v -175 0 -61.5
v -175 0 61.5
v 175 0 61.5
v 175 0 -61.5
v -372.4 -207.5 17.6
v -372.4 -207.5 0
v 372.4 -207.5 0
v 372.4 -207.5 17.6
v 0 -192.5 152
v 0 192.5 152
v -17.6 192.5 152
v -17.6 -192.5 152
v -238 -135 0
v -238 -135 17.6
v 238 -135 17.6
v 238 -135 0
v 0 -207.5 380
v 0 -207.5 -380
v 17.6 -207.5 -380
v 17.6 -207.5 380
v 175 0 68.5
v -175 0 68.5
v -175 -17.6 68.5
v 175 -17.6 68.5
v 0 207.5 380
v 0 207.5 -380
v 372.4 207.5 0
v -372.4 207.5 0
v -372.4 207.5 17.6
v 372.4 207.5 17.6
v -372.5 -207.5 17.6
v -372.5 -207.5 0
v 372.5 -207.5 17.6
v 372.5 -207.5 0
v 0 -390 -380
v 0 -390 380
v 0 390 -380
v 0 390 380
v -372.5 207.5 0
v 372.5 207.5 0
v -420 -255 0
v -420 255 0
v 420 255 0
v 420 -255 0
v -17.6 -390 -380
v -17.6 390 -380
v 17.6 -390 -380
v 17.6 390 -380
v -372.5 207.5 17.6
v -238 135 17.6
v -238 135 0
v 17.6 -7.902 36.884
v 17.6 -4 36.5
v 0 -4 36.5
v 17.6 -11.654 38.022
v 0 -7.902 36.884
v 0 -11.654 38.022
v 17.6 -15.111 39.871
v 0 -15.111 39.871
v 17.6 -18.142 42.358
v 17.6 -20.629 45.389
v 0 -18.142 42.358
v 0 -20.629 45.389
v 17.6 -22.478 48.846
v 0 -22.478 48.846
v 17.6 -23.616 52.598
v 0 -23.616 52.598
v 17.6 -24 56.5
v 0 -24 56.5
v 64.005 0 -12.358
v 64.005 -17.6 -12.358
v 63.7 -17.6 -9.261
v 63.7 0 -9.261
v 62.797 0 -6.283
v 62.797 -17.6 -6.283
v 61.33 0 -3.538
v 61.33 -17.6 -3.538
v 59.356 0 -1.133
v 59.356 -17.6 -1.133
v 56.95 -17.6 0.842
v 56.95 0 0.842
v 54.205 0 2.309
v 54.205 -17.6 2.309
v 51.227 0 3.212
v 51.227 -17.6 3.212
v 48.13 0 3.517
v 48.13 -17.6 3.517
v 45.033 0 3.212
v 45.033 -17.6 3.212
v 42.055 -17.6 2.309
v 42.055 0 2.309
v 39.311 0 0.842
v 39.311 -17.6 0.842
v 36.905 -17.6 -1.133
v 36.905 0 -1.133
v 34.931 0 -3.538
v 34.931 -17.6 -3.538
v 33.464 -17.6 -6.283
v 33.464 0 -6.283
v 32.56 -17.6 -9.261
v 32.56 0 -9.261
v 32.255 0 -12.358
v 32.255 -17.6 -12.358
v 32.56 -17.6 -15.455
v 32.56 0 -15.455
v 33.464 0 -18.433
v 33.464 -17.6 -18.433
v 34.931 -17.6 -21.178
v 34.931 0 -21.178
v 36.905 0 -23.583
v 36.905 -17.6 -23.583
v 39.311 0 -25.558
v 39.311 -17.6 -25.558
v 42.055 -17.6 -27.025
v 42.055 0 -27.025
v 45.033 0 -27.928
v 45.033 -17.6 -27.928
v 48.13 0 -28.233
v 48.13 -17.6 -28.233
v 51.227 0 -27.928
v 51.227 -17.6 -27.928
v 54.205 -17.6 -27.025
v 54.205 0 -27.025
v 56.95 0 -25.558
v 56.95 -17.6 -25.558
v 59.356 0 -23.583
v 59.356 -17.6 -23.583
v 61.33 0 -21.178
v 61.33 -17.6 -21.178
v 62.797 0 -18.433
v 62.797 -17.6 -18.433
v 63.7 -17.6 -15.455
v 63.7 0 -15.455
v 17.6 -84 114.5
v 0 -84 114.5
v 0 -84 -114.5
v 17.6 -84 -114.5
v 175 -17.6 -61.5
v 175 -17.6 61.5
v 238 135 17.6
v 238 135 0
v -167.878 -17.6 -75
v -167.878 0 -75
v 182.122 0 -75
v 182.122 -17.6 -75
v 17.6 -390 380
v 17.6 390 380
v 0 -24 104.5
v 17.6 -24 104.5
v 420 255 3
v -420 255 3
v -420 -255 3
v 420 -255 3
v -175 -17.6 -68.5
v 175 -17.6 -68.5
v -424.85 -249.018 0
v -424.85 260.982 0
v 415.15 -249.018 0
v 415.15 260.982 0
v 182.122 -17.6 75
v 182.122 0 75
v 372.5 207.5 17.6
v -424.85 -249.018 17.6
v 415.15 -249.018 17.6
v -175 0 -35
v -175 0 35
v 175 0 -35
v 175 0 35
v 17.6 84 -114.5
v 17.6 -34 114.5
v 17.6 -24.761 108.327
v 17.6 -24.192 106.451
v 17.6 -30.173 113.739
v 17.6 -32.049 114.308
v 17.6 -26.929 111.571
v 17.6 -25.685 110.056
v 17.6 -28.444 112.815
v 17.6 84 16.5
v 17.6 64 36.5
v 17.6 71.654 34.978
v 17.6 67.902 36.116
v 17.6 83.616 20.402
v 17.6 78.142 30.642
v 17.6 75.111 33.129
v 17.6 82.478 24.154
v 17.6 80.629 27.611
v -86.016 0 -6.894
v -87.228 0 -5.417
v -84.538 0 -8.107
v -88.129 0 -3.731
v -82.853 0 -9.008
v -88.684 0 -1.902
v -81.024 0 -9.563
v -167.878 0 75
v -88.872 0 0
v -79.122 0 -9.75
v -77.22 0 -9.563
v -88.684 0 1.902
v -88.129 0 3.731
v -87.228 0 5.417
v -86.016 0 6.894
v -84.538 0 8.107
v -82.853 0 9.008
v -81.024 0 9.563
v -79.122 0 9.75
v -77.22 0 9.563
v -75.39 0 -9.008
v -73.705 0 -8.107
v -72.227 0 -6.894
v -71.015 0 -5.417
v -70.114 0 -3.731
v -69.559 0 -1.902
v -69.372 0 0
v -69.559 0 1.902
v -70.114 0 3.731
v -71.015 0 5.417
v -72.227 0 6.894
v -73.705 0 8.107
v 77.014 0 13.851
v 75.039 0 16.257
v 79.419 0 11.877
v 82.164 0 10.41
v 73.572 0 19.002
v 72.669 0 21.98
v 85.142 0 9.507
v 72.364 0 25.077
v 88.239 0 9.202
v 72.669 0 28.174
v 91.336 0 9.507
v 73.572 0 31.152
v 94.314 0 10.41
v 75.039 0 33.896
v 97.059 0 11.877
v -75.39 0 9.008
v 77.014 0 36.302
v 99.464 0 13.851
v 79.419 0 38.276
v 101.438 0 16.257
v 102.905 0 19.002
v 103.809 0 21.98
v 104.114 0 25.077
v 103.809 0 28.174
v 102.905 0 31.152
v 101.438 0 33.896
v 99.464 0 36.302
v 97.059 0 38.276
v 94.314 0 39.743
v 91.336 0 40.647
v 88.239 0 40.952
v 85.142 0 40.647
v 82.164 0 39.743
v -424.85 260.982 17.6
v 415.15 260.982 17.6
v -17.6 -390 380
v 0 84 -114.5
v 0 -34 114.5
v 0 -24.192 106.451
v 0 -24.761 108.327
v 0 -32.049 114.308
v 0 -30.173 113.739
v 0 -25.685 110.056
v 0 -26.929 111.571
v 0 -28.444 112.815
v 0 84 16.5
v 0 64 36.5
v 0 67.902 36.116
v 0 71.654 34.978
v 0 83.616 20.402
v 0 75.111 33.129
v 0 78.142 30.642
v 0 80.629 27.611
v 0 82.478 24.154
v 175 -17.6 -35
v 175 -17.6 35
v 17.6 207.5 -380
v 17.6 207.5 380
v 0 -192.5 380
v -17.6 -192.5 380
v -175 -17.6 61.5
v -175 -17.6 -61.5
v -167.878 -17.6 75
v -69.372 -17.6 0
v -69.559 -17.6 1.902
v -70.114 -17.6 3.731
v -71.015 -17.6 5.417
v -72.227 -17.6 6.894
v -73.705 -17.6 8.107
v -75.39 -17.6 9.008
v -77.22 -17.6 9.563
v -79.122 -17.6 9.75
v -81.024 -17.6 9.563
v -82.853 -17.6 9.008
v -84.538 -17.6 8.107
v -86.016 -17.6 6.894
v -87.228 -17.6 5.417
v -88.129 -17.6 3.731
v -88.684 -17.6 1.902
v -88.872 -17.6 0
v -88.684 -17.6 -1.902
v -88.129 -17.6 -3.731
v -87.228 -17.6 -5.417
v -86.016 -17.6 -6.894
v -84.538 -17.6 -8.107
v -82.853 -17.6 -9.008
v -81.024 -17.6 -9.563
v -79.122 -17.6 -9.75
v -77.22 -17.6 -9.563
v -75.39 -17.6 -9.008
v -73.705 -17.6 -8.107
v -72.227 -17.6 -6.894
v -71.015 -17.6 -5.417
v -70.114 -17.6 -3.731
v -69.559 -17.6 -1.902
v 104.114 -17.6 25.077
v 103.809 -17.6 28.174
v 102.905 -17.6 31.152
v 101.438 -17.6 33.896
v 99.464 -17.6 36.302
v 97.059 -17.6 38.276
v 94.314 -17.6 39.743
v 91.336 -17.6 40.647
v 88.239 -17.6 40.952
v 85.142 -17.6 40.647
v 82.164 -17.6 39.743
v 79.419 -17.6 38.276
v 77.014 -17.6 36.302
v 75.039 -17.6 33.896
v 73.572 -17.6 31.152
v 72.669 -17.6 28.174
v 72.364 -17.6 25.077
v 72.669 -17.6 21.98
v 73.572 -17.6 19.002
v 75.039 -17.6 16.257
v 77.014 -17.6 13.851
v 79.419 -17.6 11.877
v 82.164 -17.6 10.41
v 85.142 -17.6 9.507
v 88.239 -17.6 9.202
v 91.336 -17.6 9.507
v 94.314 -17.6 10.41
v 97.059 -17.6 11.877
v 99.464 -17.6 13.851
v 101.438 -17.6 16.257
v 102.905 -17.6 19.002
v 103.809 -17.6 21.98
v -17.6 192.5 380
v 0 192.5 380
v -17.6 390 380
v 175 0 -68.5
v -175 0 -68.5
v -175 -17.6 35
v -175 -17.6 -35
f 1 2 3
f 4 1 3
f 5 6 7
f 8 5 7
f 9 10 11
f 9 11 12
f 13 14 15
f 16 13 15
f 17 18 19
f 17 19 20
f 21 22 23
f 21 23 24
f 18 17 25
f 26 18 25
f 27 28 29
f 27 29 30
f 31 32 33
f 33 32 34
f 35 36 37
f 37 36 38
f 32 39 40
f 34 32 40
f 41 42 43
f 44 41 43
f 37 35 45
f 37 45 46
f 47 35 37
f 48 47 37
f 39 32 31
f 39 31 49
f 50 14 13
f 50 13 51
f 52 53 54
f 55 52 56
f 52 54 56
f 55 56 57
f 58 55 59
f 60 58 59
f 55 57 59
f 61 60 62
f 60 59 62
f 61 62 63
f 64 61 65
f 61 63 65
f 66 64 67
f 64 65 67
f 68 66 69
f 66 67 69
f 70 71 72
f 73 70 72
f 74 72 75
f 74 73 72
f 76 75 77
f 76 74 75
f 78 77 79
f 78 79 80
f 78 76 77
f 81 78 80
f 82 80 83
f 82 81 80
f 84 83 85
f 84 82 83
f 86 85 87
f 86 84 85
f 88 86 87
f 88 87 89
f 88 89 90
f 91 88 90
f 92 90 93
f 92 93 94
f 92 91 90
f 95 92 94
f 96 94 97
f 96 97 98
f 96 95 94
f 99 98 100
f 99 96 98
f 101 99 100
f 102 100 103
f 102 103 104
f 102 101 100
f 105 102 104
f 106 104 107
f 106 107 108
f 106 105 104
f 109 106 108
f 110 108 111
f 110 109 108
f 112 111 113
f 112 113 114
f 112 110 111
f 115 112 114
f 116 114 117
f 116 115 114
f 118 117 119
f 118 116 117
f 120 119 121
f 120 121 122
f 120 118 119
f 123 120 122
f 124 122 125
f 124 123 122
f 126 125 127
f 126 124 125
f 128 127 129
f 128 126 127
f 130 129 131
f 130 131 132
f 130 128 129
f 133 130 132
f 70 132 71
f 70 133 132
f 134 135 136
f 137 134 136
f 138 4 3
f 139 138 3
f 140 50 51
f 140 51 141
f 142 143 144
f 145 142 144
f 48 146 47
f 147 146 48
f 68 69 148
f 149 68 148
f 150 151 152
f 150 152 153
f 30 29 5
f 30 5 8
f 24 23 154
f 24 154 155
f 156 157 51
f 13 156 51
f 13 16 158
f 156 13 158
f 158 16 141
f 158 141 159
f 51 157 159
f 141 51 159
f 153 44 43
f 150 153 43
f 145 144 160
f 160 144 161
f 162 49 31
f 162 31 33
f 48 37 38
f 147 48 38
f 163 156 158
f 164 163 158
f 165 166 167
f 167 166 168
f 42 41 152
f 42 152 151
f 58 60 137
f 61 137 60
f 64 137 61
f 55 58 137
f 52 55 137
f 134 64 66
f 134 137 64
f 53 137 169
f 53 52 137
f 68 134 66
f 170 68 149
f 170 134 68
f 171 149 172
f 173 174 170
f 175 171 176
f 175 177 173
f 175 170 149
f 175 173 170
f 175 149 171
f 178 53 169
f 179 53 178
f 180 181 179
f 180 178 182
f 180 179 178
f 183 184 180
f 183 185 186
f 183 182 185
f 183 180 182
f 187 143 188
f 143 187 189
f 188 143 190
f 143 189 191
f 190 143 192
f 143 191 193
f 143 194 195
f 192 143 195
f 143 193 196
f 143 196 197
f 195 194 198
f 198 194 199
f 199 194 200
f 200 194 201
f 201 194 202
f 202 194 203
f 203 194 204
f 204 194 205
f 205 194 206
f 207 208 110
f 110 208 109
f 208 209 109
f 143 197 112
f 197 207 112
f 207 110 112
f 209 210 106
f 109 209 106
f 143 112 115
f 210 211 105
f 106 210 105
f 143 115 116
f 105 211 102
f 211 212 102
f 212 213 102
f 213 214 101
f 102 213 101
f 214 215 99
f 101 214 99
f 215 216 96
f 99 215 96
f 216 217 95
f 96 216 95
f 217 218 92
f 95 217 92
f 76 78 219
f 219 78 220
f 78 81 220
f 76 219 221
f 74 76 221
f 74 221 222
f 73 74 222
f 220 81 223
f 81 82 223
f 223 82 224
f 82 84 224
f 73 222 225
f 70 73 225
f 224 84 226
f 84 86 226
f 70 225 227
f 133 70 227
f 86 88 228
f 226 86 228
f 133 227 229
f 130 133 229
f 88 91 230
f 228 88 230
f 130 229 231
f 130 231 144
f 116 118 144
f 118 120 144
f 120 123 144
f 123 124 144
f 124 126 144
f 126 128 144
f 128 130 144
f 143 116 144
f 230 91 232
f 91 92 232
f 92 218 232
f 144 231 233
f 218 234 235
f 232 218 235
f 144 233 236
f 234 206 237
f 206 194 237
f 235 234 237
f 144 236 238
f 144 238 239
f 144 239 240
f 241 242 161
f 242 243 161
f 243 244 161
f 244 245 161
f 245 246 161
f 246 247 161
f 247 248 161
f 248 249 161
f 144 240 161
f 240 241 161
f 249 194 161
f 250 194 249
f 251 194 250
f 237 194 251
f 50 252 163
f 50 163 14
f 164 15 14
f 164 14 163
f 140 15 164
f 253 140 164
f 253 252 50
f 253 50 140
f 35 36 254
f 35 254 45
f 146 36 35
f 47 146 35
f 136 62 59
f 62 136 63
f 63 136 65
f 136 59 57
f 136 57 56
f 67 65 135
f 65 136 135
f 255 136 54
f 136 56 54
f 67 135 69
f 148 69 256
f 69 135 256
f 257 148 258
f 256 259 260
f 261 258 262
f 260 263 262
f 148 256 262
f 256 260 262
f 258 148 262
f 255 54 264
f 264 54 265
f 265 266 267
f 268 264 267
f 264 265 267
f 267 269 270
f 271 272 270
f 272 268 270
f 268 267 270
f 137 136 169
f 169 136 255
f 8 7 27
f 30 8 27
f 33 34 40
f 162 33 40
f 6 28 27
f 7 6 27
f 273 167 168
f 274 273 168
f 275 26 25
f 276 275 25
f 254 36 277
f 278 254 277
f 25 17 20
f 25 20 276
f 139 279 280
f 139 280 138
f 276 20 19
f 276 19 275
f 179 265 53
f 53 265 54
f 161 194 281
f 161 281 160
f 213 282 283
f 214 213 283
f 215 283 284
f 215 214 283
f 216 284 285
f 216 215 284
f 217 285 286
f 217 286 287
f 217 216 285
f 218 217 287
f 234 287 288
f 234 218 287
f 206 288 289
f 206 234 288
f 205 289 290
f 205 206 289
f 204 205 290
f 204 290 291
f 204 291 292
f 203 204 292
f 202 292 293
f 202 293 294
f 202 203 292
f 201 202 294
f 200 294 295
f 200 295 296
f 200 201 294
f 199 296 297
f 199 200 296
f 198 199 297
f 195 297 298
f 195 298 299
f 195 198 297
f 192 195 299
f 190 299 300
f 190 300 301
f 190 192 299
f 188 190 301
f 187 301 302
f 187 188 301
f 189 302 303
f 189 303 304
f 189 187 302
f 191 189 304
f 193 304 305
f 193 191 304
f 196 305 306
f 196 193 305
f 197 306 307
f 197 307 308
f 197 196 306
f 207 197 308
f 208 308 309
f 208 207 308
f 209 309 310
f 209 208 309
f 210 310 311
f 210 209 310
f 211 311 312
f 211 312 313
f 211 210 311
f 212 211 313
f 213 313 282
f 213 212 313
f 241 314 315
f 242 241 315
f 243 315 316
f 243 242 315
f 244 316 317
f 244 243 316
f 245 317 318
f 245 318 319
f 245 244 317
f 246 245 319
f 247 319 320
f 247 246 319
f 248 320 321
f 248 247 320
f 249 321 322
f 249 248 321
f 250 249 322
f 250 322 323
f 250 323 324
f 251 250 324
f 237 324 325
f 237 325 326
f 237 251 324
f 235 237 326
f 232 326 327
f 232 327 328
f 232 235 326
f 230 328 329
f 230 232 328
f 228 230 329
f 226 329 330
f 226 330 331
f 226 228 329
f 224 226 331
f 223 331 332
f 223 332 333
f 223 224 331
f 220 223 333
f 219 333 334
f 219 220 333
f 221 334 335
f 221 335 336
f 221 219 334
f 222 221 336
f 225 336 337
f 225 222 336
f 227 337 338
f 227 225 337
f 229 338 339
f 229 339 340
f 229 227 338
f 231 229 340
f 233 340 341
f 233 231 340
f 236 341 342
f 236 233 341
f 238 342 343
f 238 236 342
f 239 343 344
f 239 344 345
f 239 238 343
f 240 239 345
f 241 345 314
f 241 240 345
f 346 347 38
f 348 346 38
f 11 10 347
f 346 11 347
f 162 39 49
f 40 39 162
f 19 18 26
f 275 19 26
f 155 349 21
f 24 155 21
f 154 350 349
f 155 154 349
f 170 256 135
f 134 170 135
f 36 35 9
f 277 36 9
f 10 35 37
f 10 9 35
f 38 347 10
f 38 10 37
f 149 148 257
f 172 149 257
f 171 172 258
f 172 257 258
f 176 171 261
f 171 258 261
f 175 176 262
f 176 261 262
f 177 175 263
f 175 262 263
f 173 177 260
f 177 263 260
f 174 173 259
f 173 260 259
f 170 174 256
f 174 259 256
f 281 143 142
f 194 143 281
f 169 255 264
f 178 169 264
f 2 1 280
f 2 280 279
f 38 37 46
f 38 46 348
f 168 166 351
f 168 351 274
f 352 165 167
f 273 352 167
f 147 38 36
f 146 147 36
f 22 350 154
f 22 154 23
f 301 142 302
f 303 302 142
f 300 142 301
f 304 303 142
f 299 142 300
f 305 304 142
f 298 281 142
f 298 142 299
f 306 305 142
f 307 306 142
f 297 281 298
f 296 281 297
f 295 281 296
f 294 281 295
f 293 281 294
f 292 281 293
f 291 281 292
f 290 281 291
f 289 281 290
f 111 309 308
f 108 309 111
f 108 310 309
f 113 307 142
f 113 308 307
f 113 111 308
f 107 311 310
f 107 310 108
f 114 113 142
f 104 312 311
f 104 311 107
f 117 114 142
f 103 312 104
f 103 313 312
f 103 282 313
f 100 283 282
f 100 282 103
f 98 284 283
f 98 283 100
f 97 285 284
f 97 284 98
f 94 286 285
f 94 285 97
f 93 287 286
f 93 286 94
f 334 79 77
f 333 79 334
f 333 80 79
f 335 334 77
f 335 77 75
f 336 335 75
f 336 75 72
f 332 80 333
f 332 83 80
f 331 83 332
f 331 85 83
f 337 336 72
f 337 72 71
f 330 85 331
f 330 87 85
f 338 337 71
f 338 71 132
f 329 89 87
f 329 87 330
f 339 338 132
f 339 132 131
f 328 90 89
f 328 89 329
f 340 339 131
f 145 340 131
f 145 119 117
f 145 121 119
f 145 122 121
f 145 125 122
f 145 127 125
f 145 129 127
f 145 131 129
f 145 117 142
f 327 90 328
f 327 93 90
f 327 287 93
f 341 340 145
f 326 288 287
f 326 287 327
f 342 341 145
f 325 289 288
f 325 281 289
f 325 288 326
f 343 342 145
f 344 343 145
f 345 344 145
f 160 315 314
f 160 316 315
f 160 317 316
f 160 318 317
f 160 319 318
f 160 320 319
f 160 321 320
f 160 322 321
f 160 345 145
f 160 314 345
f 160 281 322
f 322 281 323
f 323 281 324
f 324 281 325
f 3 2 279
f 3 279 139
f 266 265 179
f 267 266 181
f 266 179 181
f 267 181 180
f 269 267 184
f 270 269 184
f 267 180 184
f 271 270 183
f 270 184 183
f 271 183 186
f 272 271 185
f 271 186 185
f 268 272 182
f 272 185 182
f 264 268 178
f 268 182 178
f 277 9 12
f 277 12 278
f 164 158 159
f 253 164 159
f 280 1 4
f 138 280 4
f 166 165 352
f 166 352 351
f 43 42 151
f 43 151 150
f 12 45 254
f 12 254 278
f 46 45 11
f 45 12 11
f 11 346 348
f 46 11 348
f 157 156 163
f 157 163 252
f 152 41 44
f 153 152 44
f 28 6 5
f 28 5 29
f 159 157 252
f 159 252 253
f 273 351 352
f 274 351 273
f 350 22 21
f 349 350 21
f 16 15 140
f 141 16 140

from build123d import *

# Parameters (mm, degrees)
F0_W      = 840
F0_H      = 510
F1_DEPTH  = 3
F2_DEPTH  = 17.6
F4_W      = 840
F4_H      = 510
F5_DEPTH  = 3
F3_W      = 476
F3_H      = 270
F6_DEPTH  = 25
F7_W      = 197.5
F7_H      = 228
F8_DEPTH  = 17.6
F10_DEPTH = 17.6
F12_DEPTH = 17.6
F13_W     = 415
F13_H     = 760
F14_DEPTH = 17.6
F7_W_2    = 385
F15_DEPTH = 17.6
F16_W     = 745
F16_H     = 415
F17_DEPTH = 17.6
F18_W     = 350
F18_H     = 123
F19_DEPTH = 17.6
F20_W     = 350
F20_H     = 150
F20_R     = 15.875
F20_R_2   = 9.75
F21_DEPTH = 17.6
F22_W     = 350
F22_H     = 70
F23_DEPTH = 17.6
F24_W     = 350
F24_H     = 137
F25_DEPTH = 17.6
F26_W     = 744.8
F26_H     = 415
F27_DEPTH = 17.6


with BuildPart() as f1:
    # F0 (on Top) → F1 (new body)
    with BuildSketch(Plane.XY):
        with Locations((-4.8496063054, 5.9815743535)):
            Rectangle(F0_W, F0_H)
    extrude(amount=F1_DEPTH)

    # F0 (on Top) → F2 (join)
    with BuildSketch(Plane.XY):
        with Locations((-4.8496063054, 5.9815743535)):
            Rectangle(F0_W, F0_H)
    extrude(amount=F2_DEPTH)

    # F3 (on face) → F6 (cut)
    with BuildSketch(Plane.XY.offset(17.6)):
        Rectangle(F3_W, F3_H)
    extrude(amount=-F6_DEPTH, mode=Mode.SUBTRACT)


with BuildPart() as f5:
    # F4 (on Top) → F5 (new body)
    with BuildSketch(Plane.XY):
        Rectangle(F4_W, F4_H)
    extrude(amount=F5_DEPTH)


with BuildPart() as f8:
    # F7 (on Right) → F8 (new body)
    with BuildSketch(Plane.YZ):
        Polygon((390, -380), (390, 152), (192.5, 152), (-192.5, 152), (-390, 152), (-390, -380), align=None)
        with Locations((291.25, 266)):
            Rectangle(F7_W, F7_H)
        with Locations((-291.25, 266)):
            Rectangle(F7_W, F7_H)
    extrude(amount=-F8_DEPTH)


with BuildPart() as f10:
    # F9 (on Right) → F10 (new body)
    with BuildSketch(Plane.YZ):
        with BuildLine():
            Line((-84, -114.5), (84, -114.5))
            Line((84, -114.5), (84, 36.5))
            Line((84, 36.5), (-4, 36.5))
            ThreePointArc((-4, 36.5), (-18.1421356237, 42.3578643763), (-24, 56.5))
            Line((-24, 56.5), (-24, 104.5))
            ThreePointArc((-24, 104.5), (-26.9289321881, 111.5710678119), (-34, 114.5))
            Line((-34, 114.5), (-84, 114.5))
            Line((-84, 114.5), (-84, 36.5))
            Line((-84, 36.5), (-84, -114.5))
        make_face()
    extrude(amount=F10_DEPTH)

    # F11 (on face) → F12 (cut)
    with BuildSketch(Plane.YZ.offset(17.6)):
        with BuildLine():
            Line((84, 36.5), (64, 36.5))
            ThreePointArc((64, 36.5), (78.1421356237, 30.6421356237), (84, 16.5))
            Line((84, 16.5), (84, 36.5))
        make_face()
    extrude(amount=-F12_DEPTH, mode=Mode.SUBTRACT)


with BuildPart() as f14:
    # F13 (on Right) → F14 (new body)
    with BuildSketch(Plane.YZ):
        Rectangle(F13_W, F13_H)
    extrude(amount=F14_DEPTH)


with BuildPart() as f15:
    # F7 (on Right) → F15 (new body)
    with BuildSketch(Plane.YZ):
        with Locations((291.25, 266)):
            Rectangle(F7_W, F7_H)
        with Locations((0, 266)):
            Rectangle(F7_W_2, F7_H)
        Polygon((390, -380), (390, 152), (192.5, 152), (-192.5, 152), (-390, 152), (-390, -380), align=None)
        with Locations((-291.25, 266)):
            Rectangle(F7_W, F7_H)
    extrude(amount=F15_DEPTH)


with BuildPart() as f17:
    # F16 (on Top) → F17 (new body)
    with BuildSketch(Plane.XY):
        Rectangle(F16_W, F16_H)
    extrude(amount=F17_DEPTH)


with BuildPart() as f19:
    # F18 (on Front) → F19 (new body)
    with BuildSketch(Plane.XZ):
        Rectangle(F18_W, F18_H)
    extrude(amount=F19_DEPTH)


with BuildPart() as f21:
    # F20 (on Front) → F21 (new body)
    with BuildSketch(Plane.XZ):
        with Locations((7.1220991095, 0)):
            Rectangle(F20_W, F20_H)
        with Locations((48.1302849948, -12.3580349609)):
            Circle(F20_R, mode=Mode.SUBTRACT)
        with Locations((-79.1216364578, 0)):
            Circle(F20_R_2, mode=Mode.SUBTRACT)
        with Locations((88.2388576865, 25.0766351819)):
            Circle(F20_R, mode=Mode.SUBTRACT)
    extrude(amount=F21_DEPTH)


with BuildPart() as f23:
    # F22 (on Front) → F23 (new body)
    with BuildSketch(Plane.XZ):
        Rectangle(F22_W, F22_H)
    extrude(amount=F23_DEPTH)


with BuildPart() as f25:
    # F24 (on Front) → F25 (new body)
    with BuildSketch(Plane.XZ):
        Rectangle(F24_W, F24_H)
    extrude(amount=F25_DEPTH)


with BuildPart() as f27:
    # F26 (on Top) → F27 (new body)
    with BuildSketch(Plane.XY):
        Rectangle(F26_W, F26_H)
    extrude(amount=F27_DEPTH)


solid = Compound([f1.part, f5.part, f8.part, f10.part, f14.part, f15.part, f17.part, f19.part, f21.part, f23.part, f25.part, f27.part])
